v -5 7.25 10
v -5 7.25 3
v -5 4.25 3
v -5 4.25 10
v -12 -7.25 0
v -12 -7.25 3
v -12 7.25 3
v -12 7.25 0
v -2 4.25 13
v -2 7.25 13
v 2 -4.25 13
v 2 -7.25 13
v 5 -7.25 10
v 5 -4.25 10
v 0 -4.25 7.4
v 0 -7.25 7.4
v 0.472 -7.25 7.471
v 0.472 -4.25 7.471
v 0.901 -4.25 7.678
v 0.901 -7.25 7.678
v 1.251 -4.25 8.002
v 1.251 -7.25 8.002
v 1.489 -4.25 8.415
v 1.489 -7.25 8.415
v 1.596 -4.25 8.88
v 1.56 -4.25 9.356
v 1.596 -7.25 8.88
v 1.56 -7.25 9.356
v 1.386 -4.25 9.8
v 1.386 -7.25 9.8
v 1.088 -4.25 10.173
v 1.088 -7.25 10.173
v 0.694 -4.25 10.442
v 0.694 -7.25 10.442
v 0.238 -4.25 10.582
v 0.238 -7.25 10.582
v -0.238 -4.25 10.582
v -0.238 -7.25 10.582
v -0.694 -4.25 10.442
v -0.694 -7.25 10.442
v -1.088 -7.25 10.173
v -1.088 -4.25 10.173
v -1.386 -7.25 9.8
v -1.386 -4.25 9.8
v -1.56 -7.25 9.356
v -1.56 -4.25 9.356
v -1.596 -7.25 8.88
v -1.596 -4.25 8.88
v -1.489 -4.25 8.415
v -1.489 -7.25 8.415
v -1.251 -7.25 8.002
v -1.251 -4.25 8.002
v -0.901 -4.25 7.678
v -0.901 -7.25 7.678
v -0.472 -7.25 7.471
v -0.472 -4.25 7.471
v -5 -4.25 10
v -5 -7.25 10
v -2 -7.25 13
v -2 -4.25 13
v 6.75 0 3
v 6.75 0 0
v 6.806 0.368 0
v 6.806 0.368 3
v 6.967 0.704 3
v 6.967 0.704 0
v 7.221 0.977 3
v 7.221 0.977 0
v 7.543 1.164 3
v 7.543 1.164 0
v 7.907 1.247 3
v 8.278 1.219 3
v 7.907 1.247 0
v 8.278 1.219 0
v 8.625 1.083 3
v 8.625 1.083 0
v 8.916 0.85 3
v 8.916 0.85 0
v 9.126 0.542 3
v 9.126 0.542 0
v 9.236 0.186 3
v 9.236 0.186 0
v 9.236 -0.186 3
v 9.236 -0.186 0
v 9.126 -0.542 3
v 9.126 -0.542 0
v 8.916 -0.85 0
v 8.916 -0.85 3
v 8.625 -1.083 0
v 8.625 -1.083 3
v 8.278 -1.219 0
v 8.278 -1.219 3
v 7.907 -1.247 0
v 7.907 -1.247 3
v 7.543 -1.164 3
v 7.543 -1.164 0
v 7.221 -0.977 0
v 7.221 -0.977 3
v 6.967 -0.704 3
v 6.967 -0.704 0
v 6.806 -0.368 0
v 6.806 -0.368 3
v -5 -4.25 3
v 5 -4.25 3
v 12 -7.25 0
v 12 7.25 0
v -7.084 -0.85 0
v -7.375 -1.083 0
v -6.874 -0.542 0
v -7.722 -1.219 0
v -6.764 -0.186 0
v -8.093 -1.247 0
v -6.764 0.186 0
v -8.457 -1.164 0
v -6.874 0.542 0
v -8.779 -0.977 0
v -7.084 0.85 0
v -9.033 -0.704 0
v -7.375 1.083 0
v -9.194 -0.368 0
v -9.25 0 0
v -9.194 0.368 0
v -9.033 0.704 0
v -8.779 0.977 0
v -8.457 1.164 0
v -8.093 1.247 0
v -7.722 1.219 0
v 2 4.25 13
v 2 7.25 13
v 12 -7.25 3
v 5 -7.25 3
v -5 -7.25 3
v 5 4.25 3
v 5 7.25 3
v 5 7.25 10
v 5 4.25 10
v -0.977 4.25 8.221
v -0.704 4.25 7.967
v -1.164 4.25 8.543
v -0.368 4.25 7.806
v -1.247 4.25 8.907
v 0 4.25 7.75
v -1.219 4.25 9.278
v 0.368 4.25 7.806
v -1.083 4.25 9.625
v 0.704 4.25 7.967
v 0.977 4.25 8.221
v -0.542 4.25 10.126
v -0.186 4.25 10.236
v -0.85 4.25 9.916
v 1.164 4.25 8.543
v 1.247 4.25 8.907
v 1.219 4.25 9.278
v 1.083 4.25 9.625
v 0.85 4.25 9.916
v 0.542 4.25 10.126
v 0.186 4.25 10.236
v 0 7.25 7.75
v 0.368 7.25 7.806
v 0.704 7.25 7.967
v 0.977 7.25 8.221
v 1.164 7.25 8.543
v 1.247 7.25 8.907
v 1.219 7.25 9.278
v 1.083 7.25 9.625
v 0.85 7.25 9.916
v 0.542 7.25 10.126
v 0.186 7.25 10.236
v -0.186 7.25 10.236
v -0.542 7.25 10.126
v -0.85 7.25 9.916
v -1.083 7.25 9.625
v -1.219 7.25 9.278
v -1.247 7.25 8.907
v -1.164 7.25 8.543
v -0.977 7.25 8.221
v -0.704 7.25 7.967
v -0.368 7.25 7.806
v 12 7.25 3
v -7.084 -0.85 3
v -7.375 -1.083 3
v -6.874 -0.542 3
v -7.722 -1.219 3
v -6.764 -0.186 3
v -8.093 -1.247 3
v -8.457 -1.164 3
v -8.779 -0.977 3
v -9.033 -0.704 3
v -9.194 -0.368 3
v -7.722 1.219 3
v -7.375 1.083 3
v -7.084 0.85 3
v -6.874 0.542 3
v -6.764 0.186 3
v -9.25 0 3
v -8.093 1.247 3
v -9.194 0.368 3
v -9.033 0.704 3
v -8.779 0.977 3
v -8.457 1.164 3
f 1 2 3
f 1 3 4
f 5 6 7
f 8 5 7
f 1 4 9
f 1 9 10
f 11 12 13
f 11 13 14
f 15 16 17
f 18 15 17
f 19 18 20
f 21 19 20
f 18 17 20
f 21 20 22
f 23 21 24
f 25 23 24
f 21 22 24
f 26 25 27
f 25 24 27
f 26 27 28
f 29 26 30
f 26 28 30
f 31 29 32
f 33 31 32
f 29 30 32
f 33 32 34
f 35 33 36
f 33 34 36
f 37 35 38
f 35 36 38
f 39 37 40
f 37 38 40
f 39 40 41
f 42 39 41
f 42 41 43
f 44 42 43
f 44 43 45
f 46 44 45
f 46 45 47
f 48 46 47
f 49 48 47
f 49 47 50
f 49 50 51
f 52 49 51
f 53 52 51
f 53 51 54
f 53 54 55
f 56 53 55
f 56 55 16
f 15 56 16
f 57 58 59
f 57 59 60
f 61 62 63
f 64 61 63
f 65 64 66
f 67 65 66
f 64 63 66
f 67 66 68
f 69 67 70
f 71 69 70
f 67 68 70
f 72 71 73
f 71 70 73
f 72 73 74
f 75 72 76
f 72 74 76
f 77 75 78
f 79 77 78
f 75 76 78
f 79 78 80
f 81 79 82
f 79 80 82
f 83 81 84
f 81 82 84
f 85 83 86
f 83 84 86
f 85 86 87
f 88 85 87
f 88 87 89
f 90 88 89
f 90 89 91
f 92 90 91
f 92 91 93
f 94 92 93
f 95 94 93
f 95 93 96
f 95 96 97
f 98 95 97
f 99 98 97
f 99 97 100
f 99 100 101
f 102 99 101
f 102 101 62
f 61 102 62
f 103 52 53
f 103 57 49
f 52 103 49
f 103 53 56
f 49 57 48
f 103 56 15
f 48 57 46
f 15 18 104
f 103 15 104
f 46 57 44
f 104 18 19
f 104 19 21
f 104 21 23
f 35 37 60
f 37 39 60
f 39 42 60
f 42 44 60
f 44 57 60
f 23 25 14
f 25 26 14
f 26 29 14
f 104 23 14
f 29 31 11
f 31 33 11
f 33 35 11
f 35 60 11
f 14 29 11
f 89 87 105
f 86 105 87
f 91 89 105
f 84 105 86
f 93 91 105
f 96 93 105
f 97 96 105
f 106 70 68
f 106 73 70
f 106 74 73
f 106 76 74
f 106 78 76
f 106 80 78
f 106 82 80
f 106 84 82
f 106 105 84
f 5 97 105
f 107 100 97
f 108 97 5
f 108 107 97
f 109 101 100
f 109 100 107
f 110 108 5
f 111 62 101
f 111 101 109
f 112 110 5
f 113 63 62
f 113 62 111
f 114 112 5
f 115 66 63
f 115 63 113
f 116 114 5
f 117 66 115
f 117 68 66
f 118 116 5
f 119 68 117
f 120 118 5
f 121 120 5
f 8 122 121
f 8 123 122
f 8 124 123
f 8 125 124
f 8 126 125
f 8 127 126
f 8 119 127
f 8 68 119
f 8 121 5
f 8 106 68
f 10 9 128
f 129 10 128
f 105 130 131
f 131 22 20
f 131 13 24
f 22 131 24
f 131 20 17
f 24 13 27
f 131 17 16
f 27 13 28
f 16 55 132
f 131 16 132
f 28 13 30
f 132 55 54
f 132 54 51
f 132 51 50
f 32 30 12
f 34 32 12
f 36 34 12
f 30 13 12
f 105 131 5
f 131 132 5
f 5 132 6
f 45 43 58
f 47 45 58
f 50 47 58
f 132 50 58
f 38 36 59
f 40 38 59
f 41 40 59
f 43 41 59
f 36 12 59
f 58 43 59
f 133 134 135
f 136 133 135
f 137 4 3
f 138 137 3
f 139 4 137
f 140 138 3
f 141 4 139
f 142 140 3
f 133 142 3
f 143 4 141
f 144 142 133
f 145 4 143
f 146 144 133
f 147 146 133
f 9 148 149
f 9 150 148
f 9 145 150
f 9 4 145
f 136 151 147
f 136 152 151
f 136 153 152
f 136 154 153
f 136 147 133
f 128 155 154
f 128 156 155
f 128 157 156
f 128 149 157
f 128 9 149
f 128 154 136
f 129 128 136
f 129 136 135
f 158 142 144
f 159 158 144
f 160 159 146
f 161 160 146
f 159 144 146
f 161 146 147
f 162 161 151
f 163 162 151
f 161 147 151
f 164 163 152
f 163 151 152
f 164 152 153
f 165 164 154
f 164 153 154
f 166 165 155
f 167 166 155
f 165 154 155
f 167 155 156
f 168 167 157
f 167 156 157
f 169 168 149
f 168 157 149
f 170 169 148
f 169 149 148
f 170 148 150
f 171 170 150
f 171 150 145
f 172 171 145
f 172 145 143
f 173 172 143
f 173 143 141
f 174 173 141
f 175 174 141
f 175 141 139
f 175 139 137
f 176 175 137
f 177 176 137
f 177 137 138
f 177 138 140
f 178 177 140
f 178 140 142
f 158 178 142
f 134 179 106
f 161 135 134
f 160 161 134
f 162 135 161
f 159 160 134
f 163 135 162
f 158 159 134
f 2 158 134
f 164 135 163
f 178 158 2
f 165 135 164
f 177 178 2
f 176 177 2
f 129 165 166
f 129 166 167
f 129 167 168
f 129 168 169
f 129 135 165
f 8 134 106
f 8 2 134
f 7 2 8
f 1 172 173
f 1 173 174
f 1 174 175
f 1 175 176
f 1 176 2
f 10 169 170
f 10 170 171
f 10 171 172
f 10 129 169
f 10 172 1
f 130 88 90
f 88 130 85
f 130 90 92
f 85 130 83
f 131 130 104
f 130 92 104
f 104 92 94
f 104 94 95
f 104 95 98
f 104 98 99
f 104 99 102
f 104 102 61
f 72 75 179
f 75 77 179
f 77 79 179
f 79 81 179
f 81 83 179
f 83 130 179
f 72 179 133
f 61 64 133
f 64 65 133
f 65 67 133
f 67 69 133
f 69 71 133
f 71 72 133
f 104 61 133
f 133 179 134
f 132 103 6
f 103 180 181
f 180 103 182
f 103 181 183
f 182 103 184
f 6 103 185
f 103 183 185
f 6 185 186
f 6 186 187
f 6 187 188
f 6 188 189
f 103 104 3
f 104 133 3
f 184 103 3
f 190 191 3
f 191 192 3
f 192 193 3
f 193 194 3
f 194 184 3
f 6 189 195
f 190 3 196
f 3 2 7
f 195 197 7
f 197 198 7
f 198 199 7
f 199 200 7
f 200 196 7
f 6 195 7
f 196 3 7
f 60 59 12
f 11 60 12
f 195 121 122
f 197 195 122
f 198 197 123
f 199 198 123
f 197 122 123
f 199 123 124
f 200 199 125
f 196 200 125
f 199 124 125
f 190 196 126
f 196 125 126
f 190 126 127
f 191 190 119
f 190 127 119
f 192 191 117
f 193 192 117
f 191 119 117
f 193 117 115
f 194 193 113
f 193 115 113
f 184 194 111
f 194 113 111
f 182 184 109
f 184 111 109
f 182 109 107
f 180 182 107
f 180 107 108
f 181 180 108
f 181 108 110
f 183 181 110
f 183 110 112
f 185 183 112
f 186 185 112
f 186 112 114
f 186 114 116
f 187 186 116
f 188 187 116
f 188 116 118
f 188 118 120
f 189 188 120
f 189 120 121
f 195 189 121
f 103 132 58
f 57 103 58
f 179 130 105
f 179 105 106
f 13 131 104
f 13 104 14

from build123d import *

# Parameters (mm, degrees)
SKETCH_1_W          = 24
SKETCH_1_H          = 14.5
EXTRUDE_1_DEPTH     = 3
SKETCH_2_W          = 10
SKETCH_2_H          = 14
EXTRUDE_1_2_DEPTH   = 3
CUT_EXTRUDE_1_REACH = 25.457
SKETCH_3_R          = 1.6
HOLE_WIZARD_M3_2_D  = 2.5
HOLE_WIZARD_M3_1_D  = 2.5
SKETCH_10_W         = 0.5
SKETCH_10_H         = 14.5
CUT_EXTRUDE_2_DEPTH = 20.813190051
SKETCH_11_W         = 10
SKETCH_11_H         = 1
CUT_EXTRUDE_3_DEPTH = 24.205602772
CHAMFER_1_SIZE      = 3
SKETCH_12_W         = 0.5
SKETCH_12_H         = 14.5
EXTRUDE_2_DEPTH     = 3


with BuildPart() as part:
    # 草图1 → Extrude 1 (new body)
    with BuildSketch(Plane.XY):
        Rectangle(SKETCH_1_W, SKETCH_1_H)
    extrude(amount=EXTRUDE_1_DEPTH)

    # 草图2 → Extrude 1 2 (add)
    with BuildSketch(Plane.XZ.offset(7.25)):
        with Locations((0, 7)):
            Rectangle(SKETCH_2_W, SKETCH_2_H)
    extrude_1_2 = extrude(amount=-EXTRUDE_1_2_DEPTH)

    # 镜向1: Extrude 1 2 across plane
    add(extrude_1_2.mirror(Plane.ZX))

    # 草图3 → 切除-拉伸1 (cut, up to next)
    with BuildSketch(Plane.XZ.offset(7.25), mode=Mode.PRIVATE) as cut_extrude_1_sk1:
        with Locations(Location((0, 9, 0), (0, 0, 270))):
            Circle(SKETCH_3_R)
    cut_extrude_1_tool1 = extrude(cut_extrude_1_sk1.sketch, amount=-CUT_EXTRUDE_1_REACH, mode=Mode.PRIVATE) & part.part
    add(cut_extrude_1_tool1.solids().sort_by_distance((0, -7.25, 9))[0], mode=Mode.SUBTRACT)

    # M3 螺纹孔2 (through all)
    with Locations(Plane(origin=(0, 7.25, 9), x_dir=(0, 0, 1), z_dir=(0, 1, 0))):
        with Locations((0, 0)):
            Hole(HOLE_WIZARD_M3_2_D / 2)

    # M3 螺纹孔1 (through all)
    with Locations(Plane.XY.offset(3)):
        with Locations((-8, 0), (8, 0)):
            Hole(HOLE_WIZARD_M3_1_D / 2)

    # 草图10 → 切除-拉伸2 (cut, through all)
    with BuildSketch(Plane(origin=(0, 0, 0), x_dir=(-1, 0, 0), z_dir=(0, 0, -1))):
        with Locations((-11.75, 0)):
            Rectangle(SKETCH_10_W, SKETCH_10_H)
        with Locations((11.75, 0)):
            Rectangle(SKETCH_10_W, SKETCH_10_H)
    extrude(amount=-CUT_EXTRUDE_2_DEPTH, mode=Mode.SUBTRACT)

    # 草图11 → 切除-拉伸3 (cut, through all)
    with BuildSketch(Plane.XZ.offset(7.25)):
        with Locations((0, 13.5)):
            Rectangle(SKETCH_11_W, SKETCH_11_H)
    extrude(amount=-CUT_EXTRUDE_3_DEPTH, mode=Mode.SUBTRACT)

    # 倒角1
    chamfer_1_edges = [part.edges().sort_by_distance(p)[0] for p in [
        (5, -5.75, 13),
        (-5, -5.75, 13),
        (-5, 5.75, 13),
        (5, 5.75, 13),
    ]]
    chamfer(chamfer_1_edges, length=CHAMFER_1_SIZE)

    # 草图12 → 凸台-拉伸2 (add)
    with BuildSketch(Plane.XY.offset(3)):
        with Locations((11.75, 0)):
            Rectangle(SKETCH_12_W, SKETCH_12_H)
    extrude_2 = extrude(amount=-EXTRUDE_2_DEPTH)

    # 镜向2: 凸台-拉伸2 across plane
    add(extrude_2.mirror(Plane(origin=(0, 0, 0), x_dir=(0, 0, 1), z_dir=(1, 0, 0))))


solid = part.part
